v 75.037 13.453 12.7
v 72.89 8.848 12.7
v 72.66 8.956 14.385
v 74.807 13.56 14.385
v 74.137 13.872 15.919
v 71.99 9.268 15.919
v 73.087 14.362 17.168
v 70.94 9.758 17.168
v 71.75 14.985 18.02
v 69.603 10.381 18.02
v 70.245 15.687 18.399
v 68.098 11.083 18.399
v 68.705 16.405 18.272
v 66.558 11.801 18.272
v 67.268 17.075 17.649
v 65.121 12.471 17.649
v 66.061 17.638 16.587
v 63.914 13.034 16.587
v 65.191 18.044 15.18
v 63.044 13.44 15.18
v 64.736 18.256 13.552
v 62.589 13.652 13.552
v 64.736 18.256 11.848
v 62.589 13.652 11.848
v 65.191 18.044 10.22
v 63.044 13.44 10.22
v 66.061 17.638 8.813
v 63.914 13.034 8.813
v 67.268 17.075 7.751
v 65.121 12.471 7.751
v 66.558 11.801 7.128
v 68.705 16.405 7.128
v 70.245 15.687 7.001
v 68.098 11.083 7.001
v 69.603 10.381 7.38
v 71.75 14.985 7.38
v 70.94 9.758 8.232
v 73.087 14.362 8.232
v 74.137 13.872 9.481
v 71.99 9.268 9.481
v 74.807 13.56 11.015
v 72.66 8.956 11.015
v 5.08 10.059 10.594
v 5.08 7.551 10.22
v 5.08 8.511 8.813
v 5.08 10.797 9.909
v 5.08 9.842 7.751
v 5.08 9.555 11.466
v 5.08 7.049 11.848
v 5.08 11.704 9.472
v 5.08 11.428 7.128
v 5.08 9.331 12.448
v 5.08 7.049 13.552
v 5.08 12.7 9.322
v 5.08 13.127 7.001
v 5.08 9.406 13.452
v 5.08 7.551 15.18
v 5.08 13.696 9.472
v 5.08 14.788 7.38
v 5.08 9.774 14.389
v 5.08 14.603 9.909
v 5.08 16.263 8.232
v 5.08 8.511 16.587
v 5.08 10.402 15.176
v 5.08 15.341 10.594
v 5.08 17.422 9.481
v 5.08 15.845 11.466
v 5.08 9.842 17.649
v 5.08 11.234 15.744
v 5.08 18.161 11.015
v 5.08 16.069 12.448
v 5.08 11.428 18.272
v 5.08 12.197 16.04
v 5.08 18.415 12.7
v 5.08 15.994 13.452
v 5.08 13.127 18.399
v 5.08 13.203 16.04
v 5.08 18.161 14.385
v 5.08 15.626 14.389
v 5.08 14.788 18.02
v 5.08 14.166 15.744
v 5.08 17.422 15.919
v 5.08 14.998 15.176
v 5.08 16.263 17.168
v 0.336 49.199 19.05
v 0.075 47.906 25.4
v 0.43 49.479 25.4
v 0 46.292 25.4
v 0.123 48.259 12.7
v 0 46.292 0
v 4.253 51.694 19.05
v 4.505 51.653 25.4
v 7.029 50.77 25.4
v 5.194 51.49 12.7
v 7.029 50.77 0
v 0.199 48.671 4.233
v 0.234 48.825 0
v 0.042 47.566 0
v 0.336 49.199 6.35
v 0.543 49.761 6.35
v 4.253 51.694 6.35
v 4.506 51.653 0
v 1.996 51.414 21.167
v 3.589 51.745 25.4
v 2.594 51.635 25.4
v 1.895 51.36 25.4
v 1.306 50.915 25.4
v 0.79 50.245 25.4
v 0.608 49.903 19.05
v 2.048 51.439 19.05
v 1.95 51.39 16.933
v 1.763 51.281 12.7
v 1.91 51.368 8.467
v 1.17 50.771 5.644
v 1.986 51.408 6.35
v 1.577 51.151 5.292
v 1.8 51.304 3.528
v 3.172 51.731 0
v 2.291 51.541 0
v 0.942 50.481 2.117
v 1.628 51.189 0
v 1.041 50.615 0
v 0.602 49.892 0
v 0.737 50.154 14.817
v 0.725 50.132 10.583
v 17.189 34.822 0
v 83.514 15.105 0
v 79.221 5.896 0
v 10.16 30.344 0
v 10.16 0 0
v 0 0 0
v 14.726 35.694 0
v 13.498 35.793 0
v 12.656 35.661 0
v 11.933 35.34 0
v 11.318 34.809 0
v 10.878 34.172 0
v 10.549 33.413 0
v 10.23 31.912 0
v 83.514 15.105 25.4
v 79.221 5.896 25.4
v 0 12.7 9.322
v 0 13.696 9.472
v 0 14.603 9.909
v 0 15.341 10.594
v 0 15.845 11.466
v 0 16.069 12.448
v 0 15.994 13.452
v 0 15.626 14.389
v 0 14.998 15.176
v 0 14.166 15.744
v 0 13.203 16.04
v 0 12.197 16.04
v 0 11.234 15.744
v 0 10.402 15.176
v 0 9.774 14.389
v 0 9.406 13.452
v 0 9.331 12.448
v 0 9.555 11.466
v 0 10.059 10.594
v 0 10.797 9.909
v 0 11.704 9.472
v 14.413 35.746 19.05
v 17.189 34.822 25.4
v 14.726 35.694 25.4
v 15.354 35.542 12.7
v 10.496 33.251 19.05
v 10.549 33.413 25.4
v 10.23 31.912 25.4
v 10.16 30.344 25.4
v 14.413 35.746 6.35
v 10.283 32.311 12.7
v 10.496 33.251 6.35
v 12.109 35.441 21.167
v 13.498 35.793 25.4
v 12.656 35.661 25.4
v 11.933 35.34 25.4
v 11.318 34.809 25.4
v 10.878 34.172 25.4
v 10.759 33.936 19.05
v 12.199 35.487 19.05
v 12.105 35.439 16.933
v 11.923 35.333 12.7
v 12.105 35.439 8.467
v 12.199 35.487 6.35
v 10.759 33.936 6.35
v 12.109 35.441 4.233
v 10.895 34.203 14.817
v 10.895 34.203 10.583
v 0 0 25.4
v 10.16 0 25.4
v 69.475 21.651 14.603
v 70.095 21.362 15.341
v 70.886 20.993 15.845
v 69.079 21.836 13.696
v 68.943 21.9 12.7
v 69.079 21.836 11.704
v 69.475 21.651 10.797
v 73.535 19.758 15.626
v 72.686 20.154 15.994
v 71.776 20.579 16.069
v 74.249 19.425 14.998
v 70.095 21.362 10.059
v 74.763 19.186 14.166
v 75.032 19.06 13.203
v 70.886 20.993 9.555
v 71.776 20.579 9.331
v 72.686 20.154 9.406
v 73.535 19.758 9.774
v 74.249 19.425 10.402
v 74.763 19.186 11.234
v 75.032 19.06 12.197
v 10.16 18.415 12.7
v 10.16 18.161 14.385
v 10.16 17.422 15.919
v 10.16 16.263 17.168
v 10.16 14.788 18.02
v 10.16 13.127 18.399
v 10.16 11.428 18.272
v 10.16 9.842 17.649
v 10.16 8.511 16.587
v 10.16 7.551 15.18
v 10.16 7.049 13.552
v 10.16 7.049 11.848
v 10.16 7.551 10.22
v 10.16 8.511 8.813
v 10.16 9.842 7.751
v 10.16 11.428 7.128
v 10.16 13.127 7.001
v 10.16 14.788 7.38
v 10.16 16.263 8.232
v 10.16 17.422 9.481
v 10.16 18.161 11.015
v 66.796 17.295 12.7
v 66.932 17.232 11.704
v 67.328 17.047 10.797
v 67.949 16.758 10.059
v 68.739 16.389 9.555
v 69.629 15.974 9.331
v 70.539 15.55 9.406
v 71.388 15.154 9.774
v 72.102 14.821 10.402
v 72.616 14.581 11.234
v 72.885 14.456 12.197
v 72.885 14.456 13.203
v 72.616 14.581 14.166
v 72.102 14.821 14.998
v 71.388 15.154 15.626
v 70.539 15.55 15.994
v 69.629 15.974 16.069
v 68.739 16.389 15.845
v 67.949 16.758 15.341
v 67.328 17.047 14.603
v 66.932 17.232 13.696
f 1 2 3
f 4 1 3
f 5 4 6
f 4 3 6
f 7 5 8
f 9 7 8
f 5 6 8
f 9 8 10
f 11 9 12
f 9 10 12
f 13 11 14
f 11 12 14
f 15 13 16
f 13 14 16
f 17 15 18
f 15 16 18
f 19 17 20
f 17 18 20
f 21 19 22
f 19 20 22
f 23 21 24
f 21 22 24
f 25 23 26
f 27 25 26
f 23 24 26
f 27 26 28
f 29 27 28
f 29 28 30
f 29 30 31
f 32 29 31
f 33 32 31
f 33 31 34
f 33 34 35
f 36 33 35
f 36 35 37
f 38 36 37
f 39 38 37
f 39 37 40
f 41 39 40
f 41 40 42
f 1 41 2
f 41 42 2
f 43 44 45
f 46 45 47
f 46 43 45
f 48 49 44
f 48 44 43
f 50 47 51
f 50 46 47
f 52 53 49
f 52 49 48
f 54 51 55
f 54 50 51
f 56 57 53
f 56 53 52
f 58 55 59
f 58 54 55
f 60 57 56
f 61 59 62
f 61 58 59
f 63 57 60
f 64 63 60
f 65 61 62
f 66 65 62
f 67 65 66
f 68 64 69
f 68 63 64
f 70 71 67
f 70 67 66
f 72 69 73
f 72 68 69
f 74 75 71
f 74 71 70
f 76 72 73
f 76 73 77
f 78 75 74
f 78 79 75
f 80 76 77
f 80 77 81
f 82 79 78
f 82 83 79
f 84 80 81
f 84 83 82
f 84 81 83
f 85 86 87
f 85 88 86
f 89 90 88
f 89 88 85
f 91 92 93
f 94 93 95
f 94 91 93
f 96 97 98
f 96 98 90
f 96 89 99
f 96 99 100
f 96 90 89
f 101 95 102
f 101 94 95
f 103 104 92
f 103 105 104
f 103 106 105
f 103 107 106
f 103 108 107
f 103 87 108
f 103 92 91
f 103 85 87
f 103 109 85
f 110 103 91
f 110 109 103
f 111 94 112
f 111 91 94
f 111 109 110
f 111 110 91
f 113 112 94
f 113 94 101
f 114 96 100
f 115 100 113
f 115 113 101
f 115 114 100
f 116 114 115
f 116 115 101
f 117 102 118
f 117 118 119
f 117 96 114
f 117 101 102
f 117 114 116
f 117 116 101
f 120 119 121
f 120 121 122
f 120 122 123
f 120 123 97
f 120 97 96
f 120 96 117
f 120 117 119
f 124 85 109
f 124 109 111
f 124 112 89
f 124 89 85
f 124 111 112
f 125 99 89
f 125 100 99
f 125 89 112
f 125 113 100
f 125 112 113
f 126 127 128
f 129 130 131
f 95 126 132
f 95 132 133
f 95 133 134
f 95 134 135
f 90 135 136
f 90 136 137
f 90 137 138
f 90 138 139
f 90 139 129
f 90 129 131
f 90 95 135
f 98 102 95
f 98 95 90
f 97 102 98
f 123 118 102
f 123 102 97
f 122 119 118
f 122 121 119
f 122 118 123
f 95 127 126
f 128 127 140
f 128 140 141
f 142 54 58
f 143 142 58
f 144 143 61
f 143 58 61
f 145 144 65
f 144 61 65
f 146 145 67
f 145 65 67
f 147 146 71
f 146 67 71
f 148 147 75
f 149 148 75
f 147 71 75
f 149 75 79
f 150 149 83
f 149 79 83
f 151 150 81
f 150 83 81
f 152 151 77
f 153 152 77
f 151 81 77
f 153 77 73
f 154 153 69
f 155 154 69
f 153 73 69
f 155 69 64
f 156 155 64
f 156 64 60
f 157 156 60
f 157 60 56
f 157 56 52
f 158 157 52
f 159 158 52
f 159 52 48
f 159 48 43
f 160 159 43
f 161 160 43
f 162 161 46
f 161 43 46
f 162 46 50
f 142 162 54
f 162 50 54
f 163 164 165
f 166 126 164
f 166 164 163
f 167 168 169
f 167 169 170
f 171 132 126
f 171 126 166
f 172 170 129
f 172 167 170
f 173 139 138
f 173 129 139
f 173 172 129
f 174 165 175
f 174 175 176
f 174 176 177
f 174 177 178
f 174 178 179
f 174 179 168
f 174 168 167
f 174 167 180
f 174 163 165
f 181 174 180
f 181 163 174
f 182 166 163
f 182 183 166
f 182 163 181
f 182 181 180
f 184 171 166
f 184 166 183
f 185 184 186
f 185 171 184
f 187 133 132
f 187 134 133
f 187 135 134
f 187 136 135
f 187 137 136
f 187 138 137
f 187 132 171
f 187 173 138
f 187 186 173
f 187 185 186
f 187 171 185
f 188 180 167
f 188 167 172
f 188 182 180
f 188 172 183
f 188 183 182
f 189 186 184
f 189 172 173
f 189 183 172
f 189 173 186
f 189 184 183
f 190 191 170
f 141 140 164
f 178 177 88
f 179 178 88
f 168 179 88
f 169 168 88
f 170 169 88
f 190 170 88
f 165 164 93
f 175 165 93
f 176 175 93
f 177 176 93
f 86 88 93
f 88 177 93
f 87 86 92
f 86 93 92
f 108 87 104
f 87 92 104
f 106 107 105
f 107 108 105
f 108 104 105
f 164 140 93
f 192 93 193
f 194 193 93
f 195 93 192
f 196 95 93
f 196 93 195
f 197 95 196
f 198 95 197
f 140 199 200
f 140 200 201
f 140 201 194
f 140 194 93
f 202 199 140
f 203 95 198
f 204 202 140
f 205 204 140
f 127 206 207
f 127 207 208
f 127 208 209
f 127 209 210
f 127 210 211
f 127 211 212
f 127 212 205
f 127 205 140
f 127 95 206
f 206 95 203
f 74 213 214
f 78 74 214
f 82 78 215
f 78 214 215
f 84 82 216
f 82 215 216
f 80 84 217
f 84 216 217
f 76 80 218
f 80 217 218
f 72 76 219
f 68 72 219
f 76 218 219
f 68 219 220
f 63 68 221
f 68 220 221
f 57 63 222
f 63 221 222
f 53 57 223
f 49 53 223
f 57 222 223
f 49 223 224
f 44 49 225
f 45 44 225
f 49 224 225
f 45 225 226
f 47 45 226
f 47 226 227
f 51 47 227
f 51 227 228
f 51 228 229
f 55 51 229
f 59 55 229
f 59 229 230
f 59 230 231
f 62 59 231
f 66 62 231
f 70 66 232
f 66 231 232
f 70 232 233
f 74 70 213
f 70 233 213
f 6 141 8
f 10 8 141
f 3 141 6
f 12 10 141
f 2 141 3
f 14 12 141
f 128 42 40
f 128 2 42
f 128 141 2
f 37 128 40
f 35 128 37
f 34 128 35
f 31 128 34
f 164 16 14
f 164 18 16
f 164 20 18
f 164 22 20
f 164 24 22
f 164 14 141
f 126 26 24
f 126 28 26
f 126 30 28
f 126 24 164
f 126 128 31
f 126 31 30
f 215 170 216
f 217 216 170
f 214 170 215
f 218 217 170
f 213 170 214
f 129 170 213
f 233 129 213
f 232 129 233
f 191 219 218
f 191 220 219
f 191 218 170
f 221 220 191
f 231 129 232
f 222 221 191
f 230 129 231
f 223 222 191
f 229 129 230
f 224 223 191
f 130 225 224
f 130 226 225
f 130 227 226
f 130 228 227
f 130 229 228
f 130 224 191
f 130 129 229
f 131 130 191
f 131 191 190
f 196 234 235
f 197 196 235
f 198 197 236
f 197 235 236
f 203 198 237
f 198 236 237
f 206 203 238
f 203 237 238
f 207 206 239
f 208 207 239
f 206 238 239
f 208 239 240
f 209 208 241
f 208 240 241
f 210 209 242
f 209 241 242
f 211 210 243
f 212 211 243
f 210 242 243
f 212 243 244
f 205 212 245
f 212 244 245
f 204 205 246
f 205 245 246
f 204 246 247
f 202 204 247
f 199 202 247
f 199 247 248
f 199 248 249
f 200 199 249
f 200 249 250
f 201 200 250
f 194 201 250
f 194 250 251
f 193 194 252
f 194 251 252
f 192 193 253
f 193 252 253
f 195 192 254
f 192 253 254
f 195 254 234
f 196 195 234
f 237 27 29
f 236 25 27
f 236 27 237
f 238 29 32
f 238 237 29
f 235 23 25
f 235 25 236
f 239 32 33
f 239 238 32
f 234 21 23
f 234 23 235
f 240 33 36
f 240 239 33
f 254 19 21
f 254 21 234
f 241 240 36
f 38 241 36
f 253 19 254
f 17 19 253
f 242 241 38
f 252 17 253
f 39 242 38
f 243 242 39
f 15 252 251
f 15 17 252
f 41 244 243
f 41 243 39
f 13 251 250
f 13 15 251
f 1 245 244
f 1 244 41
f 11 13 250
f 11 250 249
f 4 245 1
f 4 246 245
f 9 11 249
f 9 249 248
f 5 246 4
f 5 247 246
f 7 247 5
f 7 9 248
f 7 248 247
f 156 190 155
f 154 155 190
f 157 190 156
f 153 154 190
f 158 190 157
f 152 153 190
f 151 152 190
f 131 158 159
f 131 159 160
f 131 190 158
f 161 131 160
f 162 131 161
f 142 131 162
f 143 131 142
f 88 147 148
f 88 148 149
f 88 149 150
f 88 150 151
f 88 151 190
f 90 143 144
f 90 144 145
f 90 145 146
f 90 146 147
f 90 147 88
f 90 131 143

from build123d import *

# Parameters (mm, degrees)
BOSS_EXTRUDE1_DEPTH         = 25.4
F_1_4_CLEARANCE_HOLE1_D     = 6.7564
F_1_4_CLEARANCE_HOLE1_DEPTH = 10.16
F_1_4_CLEARANCE_HOLE1_TIP   = 2.029827343
F_1_4_CLEARANCE_HOLE2_D     = 6.7564
F_1_4_CLEARANCE_HOLE2_DEPTH = 10.16
F_1_4_CLEARANCE_HOLE2_TIP   = 2.029827343
SKETCH8_R                   = 5.715
CUT_EXTRUDE1_DEPTH          = 5.08
SKETCH9_R                   = 5.715
CUT_EXTRUDE2_DEPTH          = 5.08


with BuildPart() as part:
    # Sketch1 → Boss-Extrude1 (new body)
    with BuildSketch(Plane.XY):
        Polygon((10.16, 0), (0, 0), (0, 54.048005464), (83.514454911, 15.104575572), (79.220653372, 5.896488455), (10.16, 38.1), align=None)
    extrude(amount=BOSS_EXTRUDE1_DEPTH)

    # 1/4 Clearance Hole1
    with Locations(Plane.ZY):
        with Locations((12.7, 12.7)):
            Hole(F_1_4_CLEARANCE_HOLE1_D / 2, depth=F_1_4_CLEARANCE_HOLE1_DEPTH)
            with Locations((0, 0, -(F_1_4_CLEARANCE_HOLE1_DEPTH + F_1_4_CLEARANCE_HOLE1_TIP / 2))):  # 118° drill point
                Cone(0, F_1_4_CLEARANCE_HOLE1_D / 2, F_1_4_CLEARANCE_HOLE1_TIP, mode=Mode.SUBTRACT)

    # 1/4 Clearance Hole2
    with Locations(Plane(origin=(20.701587123, 44.394696852, 0), x_dir=(0.9063077870366483, -0.42261826174070316, 0), z_dir=(0.42261826174070316, 0.9063077870366483, 0))):
        with Locations((56.606331344, -12.7)):
            Hole(F_1_4_CLEARANCE_HOLE2_D / 2, depth=F_1_4_CLEARANCE_HOLE2_DEPTH)
            with Locations((0, 0, -(F_1_4_CLEARANCE_HOLE2_DEPTH + F_1_4_CLEARANCE_HOLE2_TIP / 2))):  # 118° drill point
                Cone(0, F_1_4_CLEARANCE_HOLE2_D / 2, F_1_4_CLEARANCE_HOLE2_TIP, mode=Mode.SUBTRACT)

    # Fillet1
    # a fillet whose section is not a circle: 5.08 mm, written as the material it adds along each edge (its section moved 0.00015 mm through the faces so that the kernel can cut it)
    with BuildSketch(Plane(origin=(10.16, 38.1, 0), x_dir=(0.9063157368032501, -0.4226012129925586, 0), z_dir=(0, 0, 1))) as fillet1_piece_1:
        with BuildLine():
            add(Edge.make_bspline([(7.974002733, 0), (6.748845081, 2.3047e-05), (5.523687428, 4.6093e-05), (2.911264627, -0.681700719), (1.848095837, -2.35047216), (2.334181059, -5.00626823), (2.851934169, -6.11664789), (3.369687279, -7.227027551)], knots=[0, 0, 0, 0, 0, 0, 0.5, 0.5, 1, 1, 1, 1, 1, 1], degree=5))
            Line((3.369687279, -7.227027551), (3.277605601, -7.269963835))
            ThreePointArc((3.277605601, -7.269963835), (1.592829935, -3.656418364), (-0.092081679, -0.042936283))
            Line((-0.092081679, -0.042936283), (1.911e-06, 0.1016))
            ThreePointArc((1.911e-06, 0.1016), (3.987003276, 0.101525), (7.974004644, 0.1016))
            Line((7.974004644, 0.1016), (7.974002733, 0))
        make_face()
    extrude(amount=25.4)
    # a fillet whose section is not a circle: 5.08 mm, written as the material it takes off along each edge (its section moved 0.00015 mm through the faces so that the kernel can cut it)
    with BuildSketch(Plane(origin=(0, 54.048005464, -19.935006833), x_dir=(-1.8811129744924416e-05, -0.9999999998230706, 0), z_dir=(0, 0, 1))) as fillet1_2_piece_1:
        with BuildLine():
            add(Edge.make_bspline([(7.974002733, 0), (6.748845081, -2.3047e-05), (5.523687428, -4.6093e-05), (2.911264627, 0.681700719), (1.848095837, 2.35047216), (2.334181059, 5.00626823), (2.851934169, 6.11664789), (3.369687279, 7.227027551)], knots=[0, 0, 0, 0, 0, 0, 0.5, 0.5, 1, 1, 1, 1, 1, 1], degree=5))
            Line((3.369687279, 7.227027551), (3.277605601, 7.269963835))
            ThreePointArc((3.277605601, 7.269963835), (1.592829935, 3.656418364), (-0.092081679, 0.042936283))
            Line((-0.092081679, 0.042936283), (1.911e-06, -0.1016))
            ThreePointArc((1.911e-06, -0.1016), (3.987003276, -0.101525), (7.974004644, -0.1016))
            Line((7.974004644, -0.1016), (7.974002733, 0))
        make_face()
    extrude(amount=65.270013666, mode=Mode.SUBTRACT)

    # Sketch8 → Cut-Extrude1 (cut)
    with BuildSketch(Plane(origin=(16.407785584, 35.186609736, 0), x_dir=(0.906307787036648, -0.42261826174070366, 0), z_dir=(-0.4226182617407036, -0.9063077870366479, 0))):
        with Locations((56.606331344, 12.7)):
            Circle(SKETCH8_R)
    extrude(amount=-CUT_EXTRUDE1_DEPTH, mode=Mode.SUBTRACT)

    # Sketch9 → Cut-Extrude2 (cut)
    with BuildSketch(Plane(origin=(10.16, 0, 0), x_dir=(0, 0, -1), z_dir=(1, 0, 0))):
        with Locations(Location((-12.7, 12.7, 0), (0, 0, 90))):
            Circle(SKETCH9_R)
    extrude(amount=-CUT_EXTRUDE2_DEPTH, mode=Mode.SUBTRACT)


solid = part.part
